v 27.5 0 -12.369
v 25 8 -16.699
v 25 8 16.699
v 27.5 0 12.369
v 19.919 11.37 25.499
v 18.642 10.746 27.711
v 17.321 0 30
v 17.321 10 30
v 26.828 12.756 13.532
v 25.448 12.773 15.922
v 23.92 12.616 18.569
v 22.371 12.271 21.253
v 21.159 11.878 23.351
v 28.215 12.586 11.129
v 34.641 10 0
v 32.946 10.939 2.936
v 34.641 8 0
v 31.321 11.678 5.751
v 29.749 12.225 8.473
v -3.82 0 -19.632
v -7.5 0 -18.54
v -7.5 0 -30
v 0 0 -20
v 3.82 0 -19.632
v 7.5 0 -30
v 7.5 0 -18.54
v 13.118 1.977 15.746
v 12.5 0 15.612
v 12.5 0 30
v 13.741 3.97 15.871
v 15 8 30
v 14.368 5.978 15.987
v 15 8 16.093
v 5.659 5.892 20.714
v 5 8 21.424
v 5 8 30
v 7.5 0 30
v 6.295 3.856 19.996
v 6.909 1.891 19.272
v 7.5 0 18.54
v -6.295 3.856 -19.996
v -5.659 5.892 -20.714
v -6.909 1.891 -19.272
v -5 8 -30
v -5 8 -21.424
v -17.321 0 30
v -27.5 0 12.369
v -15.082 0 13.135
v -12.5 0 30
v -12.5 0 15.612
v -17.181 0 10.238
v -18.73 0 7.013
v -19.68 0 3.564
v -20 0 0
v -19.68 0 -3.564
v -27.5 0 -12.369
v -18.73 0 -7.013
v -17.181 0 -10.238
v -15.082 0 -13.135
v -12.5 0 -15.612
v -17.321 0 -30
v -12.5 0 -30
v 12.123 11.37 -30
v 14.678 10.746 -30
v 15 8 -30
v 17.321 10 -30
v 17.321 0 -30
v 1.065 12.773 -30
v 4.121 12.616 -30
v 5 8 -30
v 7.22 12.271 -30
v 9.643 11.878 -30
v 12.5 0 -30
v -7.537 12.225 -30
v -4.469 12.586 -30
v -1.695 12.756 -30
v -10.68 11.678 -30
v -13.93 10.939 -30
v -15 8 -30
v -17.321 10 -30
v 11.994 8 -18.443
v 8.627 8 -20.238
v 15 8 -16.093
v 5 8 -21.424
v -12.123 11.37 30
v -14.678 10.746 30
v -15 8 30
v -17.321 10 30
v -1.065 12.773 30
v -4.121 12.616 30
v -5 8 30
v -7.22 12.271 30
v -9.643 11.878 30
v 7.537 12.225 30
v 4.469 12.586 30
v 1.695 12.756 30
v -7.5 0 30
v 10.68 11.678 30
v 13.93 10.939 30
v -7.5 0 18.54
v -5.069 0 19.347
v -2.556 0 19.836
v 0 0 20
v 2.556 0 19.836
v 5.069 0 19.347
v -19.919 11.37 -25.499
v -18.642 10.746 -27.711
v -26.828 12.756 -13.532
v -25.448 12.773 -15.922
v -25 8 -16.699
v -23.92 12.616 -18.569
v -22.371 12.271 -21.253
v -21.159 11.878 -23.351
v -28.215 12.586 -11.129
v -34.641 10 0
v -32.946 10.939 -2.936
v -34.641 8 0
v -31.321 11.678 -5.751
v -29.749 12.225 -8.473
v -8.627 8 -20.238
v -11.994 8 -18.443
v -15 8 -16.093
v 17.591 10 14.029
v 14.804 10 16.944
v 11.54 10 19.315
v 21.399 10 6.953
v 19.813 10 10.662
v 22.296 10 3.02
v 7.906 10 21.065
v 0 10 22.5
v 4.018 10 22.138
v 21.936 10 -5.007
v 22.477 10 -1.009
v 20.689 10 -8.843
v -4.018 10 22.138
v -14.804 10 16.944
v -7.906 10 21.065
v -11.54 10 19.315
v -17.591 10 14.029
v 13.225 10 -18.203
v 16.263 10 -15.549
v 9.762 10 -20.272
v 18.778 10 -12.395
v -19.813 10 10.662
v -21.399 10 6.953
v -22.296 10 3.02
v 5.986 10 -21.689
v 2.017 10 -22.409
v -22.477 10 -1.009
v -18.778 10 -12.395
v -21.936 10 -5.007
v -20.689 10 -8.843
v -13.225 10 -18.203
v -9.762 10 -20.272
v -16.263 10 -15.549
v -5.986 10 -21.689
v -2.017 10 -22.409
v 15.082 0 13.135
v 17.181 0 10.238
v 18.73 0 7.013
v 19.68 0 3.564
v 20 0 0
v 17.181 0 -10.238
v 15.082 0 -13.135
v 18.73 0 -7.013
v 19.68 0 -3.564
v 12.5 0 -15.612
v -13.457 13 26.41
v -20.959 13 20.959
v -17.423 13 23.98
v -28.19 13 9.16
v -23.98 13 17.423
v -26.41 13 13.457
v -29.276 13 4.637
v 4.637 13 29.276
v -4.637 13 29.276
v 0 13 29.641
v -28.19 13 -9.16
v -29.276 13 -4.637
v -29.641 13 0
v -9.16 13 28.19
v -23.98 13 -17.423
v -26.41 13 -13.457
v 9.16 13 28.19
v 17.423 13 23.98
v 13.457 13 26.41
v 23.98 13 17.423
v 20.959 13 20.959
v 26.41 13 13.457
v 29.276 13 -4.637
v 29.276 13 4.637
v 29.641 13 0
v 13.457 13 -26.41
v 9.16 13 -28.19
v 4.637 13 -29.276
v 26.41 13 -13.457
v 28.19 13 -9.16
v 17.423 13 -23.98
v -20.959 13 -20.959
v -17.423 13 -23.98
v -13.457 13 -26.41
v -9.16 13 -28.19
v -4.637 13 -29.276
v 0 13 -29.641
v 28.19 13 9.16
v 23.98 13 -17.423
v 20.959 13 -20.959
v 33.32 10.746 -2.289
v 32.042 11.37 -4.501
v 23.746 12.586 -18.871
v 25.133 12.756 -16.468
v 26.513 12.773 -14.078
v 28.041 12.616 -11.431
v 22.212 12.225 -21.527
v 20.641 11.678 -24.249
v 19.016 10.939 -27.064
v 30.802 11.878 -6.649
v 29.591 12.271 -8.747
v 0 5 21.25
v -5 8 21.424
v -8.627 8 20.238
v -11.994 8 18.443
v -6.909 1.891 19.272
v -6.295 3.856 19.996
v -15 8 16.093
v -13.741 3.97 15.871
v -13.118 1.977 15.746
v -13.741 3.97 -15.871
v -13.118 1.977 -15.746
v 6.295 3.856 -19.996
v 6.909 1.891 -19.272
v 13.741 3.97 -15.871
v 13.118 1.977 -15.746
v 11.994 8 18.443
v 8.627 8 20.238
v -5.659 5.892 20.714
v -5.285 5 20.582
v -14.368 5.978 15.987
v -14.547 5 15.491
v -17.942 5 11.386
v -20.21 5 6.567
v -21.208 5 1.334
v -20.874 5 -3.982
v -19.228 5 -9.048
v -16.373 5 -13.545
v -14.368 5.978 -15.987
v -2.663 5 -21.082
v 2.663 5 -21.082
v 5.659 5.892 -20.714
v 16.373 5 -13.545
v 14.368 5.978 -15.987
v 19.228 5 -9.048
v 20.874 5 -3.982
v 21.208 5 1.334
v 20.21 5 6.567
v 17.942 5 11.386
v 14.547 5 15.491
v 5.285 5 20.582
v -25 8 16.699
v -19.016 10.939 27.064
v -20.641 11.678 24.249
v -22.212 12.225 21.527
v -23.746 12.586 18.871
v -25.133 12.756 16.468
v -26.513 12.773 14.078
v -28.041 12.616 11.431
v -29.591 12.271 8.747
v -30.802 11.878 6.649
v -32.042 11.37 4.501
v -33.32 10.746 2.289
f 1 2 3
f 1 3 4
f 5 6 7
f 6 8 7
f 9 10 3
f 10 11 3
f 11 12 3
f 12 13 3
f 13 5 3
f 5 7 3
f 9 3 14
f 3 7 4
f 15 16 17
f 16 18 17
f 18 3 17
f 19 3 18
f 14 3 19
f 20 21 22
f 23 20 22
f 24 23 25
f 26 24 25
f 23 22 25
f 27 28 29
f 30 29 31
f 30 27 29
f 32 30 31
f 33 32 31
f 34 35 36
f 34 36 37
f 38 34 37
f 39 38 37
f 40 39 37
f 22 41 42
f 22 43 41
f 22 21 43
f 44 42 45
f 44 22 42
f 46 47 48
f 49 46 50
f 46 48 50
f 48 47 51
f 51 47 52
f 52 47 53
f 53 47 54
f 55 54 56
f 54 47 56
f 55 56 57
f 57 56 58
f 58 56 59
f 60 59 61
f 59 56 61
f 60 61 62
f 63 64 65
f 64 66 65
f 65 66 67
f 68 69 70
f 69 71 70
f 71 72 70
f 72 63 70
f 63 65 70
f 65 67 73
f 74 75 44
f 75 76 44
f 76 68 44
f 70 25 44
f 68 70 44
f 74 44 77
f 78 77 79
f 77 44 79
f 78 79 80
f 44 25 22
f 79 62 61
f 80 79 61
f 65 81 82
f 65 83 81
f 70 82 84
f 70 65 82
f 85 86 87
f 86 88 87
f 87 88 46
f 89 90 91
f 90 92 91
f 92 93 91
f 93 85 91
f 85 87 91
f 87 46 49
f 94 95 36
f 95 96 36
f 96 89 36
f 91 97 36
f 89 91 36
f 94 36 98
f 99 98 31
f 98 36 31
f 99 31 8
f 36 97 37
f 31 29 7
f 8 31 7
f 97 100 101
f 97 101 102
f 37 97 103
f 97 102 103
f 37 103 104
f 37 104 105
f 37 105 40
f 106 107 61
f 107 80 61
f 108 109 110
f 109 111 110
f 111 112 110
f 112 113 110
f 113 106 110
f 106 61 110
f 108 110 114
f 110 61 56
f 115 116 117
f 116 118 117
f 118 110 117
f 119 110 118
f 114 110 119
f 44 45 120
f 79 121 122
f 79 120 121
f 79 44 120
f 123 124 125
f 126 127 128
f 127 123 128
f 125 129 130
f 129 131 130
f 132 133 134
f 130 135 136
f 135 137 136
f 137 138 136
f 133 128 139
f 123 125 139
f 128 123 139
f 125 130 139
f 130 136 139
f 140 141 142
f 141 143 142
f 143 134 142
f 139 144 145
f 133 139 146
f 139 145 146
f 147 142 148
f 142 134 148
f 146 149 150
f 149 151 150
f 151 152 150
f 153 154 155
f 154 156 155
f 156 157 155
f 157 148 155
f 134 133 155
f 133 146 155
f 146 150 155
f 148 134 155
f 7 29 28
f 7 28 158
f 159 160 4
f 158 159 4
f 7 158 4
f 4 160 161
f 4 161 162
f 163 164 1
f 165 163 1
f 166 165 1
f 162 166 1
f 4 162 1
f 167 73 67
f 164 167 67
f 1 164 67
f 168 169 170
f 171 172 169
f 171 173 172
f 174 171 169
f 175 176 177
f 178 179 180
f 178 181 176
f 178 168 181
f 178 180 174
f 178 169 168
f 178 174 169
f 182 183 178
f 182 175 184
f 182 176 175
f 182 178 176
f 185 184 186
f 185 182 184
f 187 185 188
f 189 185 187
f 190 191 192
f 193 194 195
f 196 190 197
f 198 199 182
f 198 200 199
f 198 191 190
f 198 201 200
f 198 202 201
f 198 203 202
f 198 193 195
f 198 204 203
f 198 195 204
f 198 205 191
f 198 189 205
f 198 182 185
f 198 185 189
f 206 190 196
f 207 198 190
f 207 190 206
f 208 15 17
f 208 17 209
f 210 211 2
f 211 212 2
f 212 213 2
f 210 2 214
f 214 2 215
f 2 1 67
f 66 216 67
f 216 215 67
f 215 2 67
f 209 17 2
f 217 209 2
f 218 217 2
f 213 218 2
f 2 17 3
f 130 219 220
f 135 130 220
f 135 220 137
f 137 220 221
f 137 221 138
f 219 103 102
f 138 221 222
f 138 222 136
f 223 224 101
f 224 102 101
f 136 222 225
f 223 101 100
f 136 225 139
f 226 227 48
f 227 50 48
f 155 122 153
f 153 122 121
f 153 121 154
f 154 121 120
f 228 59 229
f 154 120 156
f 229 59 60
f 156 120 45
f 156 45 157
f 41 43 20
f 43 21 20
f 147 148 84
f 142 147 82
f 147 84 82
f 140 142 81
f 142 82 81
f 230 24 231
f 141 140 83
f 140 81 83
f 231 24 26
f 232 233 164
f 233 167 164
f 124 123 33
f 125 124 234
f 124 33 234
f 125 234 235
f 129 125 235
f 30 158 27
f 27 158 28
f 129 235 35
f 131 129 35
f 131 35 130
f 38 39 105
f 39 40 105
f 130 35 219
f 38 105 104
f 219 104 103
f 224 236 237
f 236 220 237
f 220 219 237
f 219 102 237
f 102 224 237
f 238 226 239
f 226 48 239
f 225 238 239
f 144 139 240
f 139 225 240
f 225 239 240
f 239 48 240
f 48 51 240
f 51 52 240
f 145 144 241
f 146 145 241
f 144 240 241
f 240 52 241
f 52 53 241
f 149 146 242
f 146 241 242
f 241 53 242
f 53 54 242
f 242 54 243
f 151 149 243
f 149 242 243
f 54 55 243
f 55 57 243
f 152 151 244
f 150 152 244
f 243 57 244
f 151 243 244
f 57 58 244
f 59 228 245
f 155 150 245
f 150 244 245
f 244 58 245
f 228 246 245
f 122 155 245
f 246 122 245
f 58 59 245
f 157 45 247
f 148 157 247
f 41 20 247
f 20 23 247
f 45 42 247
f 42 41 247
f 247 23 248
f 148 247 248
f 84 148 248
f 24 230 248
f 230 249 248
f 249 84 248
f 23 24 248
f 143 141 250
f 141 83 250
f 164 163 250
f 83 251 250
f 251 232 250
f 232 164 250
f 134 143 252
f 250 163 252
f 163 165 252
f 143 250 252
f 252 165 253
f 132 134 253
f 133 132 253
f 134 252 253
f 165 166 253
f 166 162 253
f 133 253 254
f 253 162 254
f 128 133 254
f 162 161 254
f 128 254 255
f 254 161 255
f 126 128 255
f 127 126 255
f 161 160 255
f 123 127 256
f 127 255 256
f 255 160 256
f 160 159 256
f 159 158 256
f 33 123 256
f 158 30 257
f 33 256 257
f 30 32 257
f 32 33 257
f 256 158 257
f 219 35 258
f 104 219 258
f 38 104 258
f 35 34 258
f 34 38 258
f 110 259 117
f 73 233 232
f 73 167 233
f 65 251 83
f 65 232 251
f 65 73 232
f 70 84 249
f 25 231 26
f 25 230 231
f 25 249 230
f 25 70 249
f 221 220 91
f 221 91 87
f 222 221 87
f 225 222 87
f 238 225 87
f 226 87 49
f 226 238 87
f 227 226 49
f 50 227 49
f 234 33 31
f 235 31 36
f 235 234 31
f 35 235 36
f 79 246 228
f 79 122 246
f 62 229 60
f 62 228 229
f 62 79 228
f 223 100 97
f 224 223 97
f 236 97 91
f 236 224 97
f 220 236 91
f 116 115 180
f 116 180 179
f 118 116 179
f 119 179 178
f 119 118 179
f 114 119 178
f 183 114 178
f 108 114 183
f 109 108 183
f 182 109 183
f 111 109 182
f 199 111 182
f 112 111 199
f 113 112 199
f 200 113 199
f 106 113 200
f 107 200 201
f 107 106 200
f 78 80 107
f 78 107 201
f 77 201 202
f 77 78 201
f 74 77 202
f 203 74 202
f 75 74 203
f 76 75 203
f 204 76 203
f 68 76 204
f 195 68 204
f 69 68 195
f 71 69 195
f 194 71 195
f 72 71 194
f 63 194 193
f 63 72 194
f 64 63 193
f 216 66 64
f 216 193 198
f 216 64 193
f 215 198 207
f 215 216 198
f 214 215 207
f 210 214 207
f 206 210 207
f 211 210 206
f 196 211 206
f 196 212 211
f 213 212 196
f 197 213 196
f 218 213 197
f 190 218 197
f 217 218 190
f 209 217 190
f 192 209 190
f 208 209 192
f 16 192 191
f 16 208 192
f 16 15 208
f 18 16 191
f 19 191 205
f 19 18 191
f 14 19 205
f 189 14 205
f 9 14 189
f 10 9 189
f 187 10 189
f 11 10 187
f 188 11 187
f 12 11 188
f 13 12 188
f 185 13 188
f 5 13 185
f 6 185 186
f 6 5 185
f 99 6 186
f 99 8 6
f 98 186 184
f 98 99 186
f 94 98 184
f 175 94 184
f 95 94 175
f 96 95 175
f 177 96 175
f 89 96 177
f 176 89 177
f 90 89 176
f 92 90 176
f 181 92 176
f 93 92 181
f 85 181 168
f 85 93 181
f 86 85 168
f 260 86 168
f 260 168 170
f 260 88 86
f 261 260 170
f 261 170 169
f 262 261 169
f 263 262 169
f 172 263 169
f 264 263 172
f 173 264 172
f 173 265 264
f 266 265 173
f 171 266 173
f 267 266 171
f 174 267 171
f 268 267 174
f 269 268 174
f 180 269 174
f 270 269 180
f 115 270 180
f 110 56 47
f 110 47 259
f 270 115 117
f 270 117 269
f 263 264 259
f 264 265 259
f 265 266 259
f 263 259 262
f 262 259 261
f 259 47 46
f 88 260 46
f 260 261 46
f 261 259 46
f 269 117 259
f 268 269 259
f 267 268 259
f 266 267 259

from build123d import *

# Parameters (mm, degrees)
EXTRUDE_1_DEPTH          = 13
CUT_EXTRUDE_1_DEPTH      = 48.634021455
CUT_EXTRUDE_1_DEPTH_BACK = 48.634021455


with BuildPart() as part:
    # 草圖1 → 填料-伸長1 (new body)
    with BuildSketch(Plane(origin=(0, 0, 0), x_dir=(1, 0, 0), z_dir=(0, 1, 0))):
        Polygon((17.320508076, -30), (34.641016151, 0), (17.320508076, 30), (-17.320508076, 30), (-34.641016151, 0), (-17.320508076, -30), align=None)
    extrude(amount=EXTRUDE_1_DEPTH)

    # 草圖2 → 除料-伸長1 (cut, two sides: drawn at the far end of the back side and taken through both)
    with BuildSketch(Plane.XY.offset(-CUT_EXTRUDE_1_DEPTH_BACK)):
        Polygon((-12.5, 0), (-7.5, 0), (-5, 8), (-15, 8), align=None)
        Polygon((-34.641016151, 0), (-27.5, 0), (-25, 8), (-34.641016151, 8), align=None)
        Polygon((5, 8), (7.5, 0), (12.5, 0), (15, 8), align=None)
        Polygon((25, 8), (27.5, 0), (34.641016151, 0), (34.641016151, 8), align=None)
    extrude(amount=CUT_EXTRUDE_1_DEPTH + CUT_EXTRUDE_1_DEPTH_BACK, mode=Mode.SUBTRACT)

    # 草圖3 → 除料-旋轉1 (revolve, cut)
    with BuildSketch(Plane.XY, mode=Mode.PRIVATE) as cut_revolve_1_sk:
        Polygon((0, 10), (-22.5, 10), (-20, 0), (0, 0), align=None)
    revolve(cut_revolve_1_sk.sketch.rotate(Axis((0, 13.801022721, 0), (0, -1, 0)), 270), axis=Axis((0, 13.801022721, 0), (0, -1, 0)), mode=Mode.SUBTRACT)

    # 草圖4 → 除料-旋轉7 (revolve, cut)
    with BuildSketch(Plane.XY, mode=Mode.PRIVATE) as cut_revolve_7_sk:
        Polygon((34.641016151, 10), (34.641016151, 13), (29.641016151, 13), align=None)
    revolve(cut_revolve_7_sk.sketch.rotate(Axis((0, 13, 0), (0, -1, 0)), 180), axis=Axis((0, 13, 0), (0, -1, 0)), mode=Mode.SUBTRACT)


solid = part.part
